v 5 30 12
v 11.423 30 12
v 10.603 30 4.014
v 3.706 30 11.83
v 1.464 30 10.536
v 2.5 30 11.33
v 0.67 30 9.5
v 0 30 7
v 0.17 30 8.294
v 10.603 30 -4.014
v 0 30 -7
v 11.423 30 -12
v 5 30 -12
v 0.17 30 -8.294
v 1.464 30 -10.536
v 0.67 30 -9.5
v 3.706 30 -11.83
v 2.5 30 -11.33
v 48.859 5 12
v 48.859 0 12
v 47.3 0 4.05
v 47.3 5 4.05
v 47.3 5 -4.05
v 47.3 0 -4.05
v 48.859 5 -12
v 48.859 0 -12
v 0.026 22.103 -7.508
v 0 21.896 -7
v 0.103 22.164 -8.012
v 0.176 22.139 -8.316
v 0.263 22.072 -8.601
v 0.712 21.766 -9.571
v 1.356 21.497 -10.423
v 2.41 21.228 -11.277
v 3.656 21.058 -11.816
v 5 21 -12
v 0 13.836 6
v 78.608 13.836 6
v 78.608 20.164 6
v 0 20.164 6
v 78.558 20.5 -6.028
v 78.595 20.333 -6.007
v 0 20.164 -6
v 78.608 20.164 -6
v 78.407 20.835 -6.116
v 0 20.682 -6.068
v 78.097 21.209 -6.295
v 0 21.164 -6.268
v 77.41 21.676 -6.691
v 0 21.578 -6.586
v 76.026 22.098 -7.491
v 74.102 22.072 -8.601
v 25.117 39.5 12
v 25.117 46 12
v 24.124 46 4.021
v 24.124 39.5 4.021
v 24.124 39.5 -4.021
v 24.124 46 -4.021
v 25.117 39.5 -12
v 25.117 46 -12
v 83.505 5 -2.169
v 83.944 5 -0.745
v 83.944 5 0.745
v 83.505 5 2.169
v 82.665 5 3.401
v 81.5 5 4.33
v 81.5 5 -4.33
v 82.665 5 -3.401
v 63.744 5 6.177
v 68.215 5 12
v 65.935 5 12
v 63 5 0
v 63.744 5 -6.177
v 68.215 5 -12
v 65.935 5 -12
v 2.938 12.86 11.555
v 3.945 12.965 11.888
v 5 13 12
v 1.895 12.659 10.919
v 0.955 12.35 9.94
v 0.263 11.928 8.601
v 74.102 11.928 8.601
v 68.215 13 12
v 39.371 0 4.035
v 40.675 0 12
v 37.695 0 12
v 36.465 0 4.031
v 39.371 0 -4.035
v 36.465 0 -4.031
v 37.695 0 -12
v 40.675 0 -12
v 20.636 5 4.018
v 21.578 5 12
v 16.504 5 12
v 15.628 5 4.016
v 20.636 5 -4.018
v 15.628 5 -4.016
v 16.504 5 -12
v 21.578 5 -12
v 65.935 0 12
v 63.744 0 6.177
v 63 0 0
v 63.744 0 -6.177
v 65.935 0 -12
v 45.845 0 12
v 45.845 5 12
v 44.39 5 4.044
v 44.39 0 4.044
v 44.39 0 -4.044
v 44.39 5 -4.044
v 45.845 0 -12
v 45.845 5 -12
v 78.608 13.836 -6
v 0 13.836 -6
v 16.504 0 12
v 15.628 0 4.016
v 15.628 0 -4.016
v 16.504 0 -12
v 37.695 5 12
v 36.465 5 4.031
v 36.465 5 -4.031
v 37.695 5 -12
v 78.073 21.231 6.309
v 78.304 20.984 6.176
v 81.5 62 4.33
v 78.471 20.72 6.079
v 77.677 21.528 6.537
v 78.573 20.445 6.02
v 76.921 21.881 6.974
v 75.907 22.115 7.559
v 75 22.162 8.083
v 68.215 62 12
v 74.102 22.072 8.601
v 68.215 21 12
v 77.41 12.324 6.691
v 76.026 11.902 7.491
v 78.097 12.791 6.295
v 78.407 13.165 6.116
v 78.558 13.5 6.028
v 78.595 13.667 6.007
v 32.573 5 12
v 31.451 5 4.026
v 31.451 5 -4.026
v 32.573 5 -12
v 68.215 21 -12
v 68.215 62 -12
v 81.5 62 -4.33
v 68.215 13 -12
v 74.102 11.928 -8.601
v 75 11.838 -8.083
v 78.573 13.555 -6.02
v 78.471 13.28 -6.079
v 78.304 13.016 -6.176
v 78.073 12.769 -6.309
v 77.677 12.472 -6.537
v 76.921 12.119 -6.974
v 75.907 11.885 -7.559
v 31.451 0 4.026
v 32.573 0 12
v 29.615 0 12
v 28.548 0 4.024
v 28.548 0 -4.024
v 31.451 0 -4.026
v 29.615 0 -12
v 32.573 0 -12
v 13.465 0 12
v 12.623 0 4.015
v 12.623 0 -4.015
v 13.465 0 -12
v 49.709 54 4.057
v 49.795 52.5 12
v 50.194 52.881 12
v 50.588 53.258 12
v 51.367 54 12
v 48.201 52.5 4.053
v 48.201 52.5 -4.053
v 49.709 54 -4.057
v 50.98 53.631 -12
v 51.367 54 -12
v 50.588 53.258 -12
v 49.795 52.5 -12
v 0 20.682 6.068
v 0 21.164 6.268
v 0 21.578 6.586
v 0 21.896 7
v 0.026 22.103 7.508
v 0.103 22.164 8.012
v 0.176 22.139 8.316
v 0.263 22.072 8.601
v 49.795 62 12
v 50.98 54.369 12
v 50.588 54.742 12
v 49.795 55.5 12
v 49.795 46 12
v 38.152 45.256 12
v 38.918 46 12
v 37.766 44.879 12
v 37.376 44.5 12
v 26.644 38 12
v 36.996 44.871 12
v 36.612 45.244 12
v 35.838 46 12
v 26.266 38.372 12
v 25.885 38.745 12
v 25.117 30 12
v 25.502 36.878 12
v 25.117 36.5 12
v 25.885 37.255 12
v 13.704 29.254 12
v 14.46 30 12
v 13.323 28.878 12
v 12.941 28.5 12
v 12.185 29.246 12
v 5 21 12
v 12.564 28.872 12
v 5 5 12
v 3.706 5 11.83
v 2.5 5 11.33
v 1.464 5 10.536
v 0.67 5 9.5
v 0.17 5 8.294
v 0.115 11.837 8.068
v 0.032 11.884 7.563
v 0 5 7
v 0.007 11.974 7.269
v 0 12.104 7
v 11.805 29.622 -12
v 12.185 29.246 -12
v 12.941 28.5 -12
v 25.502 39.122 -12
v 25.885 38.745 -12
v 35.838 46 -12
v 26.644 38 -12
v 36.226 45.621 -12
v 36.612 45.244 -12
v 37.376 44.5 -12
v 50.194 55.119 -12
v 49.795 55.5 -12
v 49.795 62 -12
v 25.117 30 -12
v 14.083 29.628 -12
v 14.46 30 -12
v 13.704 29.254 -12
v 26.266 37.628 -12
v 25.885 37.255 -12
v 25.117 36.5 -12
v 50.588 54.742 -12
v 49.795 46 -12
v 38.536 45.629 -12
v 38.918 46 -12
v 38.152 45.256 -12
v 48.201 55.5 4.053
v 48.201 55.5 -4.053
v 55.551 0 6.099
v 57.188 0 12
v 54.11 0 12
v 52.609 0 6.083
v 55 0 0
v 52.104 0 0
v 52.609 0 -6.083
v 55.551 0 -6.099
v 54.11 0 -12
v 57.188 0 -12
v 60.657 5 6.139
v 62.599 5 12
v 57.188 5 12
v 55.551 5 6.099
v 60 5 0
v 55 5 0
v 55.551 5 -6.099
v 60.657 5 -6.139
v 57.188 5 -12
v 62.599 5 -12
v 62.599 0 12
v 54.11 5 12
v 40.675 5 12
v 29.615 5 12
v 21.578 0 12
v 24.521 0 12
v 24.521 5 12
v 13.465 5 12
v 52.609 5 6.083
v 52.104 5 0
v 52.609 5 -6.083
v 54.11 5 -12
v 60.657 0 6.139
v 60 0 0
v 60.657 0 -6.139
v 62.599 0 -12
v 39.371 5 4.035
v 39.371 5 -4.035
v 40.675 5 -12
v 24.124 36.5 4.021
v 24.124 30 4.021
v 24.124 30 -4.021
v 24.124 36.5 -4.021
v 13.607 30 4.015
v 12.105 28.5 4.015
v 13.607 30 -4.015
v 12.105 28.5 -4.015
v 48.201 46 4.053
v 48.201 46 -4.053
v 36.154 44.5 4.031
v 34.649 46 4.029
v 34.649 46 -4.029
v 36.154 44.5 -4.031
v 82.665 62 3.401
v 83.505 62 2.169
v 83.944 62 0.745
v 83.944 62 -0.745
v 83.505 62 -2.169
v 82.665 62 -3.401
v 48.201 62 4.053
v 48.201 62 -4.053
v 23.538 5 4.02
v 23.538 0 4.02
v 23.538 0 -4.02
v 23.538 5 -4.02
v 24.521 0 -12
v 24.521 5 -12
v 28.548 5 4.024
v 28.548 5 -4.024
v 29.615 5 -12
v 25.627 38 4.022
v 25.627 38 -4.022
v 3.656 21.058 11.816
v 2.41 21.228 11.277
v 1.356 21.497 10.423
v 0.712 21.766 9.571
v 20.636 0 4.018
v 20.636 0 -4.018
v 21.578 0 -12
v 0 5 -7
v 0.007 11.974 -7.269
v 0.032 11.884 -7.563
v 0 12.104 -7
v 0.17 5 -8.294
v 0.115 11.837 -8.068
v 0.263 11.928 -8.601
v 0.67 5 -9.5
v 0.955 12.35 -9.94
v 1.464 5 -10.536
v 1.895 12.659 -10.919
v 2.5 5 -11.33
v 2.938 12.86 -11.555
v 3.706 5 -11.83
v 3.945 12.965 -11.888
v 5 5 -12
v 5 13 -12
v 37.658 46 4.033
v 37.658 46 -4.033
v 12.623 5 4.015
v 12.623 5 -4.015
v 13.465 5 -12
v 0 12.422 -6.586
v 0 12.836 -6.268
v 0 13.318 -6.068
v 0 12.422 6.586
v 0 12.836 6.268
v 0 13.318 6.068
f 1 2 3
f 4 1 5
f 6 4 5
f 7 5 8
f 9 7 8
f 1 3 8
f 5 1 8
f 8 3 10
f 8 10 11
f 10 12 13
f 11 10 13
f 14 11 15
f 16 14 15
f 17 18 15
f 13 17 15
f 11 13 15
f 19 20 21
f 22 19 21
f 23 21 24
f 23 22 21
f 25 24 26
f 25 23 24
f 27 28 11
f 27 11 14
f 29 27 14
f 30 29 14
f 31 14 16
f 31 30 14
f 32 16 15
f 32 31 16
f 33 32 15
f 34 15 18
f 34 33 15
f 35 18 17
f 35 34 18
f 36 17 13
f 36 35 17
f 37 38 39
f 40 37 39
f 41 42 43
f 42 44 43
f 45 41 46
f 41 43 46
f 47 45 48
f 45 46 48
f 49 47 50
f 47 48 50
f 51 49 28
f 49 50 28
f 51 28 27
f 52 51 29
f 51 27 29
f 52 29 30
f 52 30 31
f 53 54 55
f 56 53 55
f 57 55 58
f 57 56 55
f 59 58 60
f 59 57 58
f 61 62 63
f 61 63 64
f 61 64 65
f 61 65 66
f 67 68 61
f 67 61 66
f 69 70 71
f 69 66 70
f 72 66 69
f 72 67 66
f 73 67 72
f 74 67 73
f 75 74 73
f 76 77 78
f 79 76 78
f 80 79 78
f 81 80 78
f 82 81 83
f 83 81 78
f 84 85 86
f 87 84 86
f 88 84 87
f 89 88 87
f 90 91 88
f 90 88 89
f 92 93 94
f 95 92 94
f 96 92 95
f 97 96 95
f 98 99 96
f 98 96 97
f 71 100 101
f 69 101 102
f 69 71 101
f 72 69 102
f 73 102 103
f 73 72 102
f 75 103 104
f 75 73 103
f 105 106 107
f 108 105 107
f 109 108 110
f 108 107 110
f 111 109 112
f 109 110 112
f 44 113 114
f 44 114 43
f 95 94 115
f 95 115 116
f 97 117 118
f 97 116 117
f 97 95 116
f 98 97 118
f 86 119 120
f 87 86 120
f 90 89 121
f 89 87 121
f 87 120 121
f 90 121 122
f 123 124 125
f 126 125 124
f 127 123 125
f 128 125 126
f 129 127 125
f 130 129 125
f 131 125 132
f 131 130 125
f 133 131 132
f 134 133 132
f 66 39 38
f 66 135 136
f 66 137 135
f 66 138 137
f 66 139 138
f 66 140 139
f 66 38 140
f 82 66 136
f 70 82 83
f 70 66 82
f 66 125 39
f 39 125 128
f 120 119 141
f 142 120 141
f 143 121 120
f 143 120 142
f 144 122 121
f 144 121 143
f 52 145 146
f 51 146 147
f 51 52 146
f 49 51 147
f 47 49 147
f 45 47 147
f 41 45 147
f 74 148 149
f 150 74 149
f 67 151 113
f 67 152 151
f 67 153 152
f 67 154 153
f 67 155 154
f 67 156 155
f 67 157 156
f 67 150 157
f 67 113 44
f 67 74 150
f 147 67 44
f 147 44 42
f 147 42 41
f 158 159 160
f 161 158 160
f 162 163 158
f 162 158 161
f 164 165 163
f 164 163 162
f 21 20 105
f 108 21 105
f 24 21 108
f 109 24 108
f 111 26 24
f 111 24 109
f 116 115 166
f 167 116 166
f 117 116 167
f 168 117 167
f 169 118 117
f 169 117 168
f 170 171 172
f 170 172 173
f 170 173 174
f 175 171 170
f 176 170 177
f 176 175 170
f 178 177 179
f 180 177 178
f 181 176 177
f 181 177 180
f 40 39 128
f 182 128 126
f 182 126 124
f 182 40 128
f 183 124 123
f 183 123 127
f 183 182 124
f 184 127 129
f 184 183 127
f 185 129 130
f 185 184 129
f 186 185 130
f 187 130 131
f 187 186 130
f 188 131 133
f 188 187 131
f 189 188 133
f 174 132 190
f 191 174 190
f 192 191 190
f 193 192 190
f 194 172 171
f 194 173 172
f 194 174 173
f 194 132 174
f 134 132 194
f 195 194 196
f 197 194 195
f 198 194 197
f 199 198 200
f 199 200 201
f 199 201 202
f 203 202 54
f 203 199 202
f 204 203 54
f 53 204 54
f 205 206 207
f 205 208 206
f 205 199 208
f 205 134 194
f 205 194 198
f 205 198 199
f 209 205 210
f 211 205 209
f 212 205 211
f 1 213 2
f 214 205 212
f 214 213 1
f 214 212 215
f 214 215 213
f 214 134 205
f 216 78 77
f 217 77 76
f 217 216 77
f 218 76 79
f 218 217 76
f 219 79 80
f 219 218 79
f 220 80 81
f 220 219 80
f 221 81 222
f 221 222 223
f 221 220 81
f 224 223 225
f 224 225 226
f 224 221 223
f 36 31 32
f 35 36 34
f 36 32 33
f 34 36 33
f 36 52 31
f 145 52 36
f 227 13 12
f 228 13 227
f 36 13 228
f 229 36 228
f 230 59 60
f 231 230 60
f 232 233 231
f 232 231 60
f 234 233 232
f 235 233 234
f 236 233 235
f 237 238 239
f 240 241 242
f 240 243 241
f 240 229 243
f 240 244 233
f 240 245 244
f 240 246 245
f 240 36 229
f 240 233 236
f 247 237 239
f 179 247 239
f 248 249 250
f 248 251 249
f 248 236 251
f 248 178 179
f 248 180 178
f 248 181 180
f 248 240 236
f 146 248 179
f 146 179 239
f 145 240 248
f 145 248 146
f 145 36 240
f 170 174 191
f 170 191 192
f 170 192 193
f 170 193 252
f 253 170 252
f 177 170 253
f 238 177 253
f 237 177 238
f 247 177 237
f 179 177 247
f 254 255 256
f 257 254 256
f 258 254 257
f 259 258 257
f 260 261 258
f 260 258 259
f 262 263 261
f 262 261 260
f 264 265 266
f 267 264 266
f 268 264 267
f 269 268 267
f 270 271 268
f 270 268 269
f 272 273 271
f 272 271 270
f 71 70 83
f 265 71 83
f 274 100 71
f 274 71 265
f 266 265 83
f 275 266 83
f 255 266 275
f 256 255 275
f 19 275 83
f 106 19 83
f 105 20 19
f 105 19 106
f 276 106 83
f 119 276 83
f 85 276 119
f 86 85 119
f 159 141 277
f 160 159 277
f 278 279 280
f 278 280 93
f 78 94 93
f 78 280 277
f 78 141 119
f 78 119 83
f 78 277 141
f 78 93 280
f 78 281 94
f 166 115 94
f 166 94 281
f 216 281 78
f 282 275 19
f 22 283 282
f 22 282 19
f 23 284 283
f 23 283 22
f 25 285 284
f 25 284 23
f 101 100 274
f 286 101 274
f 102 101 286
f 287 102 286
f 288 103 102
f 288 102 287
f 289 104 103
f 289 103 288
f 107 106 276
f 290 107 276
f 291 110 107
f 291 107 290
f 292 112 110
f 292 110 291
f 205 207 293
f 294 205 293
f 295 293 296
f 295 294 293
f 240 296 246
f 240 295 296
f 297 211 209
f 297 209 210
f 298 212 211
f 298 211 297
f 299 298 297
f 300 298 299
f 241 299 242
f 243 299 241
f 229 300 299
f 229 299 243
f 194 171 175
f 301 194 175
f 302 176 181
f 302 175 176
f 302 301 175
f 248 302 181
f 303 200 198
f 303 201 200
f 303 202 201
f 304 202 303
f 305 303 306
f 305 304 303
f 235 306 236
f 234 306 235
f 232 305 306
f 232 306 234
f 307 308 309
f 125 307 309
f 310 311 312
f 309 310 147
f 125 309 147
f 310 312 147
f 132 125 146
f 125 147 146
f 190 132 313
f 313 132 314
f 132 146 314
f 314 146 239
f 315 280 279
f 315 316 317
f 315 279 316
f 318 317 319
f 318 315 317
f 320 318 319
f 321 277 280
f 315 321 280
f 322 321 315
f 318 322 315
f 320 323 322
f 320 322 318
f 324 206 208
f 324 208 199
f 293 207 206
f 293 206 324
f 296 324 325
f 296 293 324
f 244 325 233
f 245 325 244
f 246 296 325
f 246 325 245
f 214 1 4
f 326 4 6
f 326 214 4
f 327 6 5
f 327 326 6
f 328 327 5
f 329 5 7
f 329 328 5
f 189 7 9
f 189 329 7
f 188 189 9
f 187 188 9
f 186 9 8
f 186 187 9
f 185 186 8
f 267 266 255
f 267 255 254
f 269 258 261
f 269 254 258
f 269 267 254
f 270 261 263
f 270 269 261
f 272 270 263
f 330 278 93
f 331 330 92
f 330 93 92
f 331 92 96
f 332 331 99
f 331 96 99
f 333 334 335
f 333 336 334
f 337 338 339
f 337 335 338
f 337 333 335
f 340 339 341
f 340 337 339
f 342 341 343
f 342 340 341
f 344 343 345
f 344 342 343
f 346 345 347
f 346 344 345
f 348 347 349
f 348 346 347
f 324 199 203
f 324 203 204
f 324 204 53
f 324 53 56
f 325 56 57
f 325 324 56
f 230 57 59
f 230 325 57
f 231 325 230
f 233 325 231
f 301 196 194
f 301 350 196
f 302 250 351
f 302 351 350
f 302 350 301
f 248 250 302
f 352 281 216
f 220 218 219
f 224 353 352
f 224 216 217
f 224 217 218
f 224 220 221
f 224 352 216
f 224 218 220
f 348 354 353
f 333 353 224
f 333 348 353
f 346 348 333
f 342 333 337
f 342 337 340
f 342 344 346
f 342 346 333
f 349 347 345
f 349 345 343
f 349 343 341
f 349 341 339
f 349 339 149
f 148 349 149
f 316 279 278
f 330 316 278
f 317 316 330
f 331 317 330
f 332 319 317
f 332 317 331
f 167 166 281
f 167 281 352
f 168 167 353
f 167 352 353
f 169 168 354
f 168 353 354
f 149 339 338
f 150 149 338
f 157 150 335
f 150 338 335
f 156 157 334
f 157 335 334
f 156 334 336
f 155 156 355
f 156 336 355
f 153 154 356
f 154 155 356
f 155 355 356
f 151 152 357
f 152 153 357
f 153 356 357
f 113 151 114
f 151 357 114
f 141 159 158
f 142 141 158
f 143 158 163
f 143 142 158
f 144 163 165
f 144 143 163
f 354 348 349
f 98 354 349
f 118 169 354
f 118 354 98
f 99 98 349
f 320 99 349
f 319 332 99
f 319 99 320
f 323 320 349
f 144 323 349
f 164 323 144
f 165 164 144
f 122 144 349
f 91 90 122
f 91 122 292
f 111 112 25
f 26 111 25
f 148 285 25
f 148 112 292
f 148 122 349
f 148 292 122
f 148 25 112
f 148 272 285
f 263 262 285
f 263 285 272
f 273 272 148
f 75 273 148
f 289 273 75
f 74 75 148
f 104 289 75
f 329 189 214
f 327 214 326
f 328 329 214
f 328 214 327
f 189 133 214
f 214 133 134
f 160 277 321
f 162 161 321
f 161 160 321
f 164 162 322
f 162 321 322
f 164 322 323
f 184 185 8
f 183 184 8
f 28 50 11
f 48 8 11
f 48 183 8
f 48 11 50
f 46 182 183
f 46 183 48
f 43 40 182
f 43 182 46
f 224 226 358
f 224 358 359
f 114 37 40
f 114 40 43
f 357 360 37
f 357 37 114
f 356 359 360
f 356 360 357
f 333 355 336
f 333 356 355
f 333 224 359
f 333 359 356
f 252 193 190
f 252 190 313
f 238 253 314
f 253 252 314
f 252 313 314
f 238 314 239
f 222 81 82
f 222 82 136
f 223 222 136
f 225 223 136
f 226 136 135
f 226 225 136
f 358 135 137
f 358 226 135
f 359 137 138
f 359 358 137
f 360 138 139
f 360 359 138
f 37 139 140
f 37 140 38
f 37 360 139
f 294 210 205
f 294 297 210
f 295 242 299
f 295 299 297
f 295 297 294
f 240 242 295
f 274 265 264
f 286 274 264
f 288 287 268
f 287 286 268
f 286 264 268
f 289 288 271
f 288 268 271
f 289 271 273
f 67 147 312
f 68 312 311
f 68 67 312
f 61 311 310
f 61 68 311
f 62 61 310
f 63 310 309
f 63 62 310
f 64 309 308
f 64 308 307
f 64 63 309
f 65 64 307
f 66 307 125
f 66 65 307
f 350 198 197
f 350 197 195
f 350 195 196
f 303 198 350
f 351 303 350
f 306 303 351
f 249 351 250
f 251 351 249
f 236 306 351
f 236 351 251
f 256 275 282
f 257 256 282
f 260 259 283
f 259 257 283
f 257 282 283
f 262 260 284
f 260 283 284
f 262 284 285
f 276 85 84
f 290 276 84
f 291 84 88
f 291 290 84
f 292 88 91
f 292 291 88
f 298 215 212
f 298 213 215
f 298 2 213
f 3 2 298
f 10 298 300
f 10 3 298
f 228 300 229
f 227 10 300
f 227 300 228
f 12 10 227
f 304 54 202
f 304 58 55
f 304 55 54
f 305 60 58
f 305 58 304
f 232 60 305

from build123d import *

# Parameters (mm, degrees)
BOSS_EXTRUDE1_DEPTH = 62
SKETCH5_W           = 26
SKETCH5_H           = 5
SKETCH5_W_2         = 5
SKETCH5_W_3         = 14.428632876
CUT_EXTRUDE1_DEPTH  = 106.090437243


with BuildPart() as part:
    # Sketch1 → Boss-Extrude1 (new body)
    with BuildSketch(Plane(origin=(0, 0, 0), x_dir=(1, 0, 0), z_dir=(0, 1, 0))):
        with BuildLine():
            Line((0, -7), (0, 7))
            ThreePointArc((0, 7), (1.464466094, 10.535533906), (5, 12))
            Line((5, 12), (68.215390309, 12))
            Line((68.215390309, 12), (81.5, 4.330127019))
            ThreePointArc((81.5, 4.330127019), (84, 0), (81.5, -4.330127019))
            Line((81.5, -4.330127019), (68.215390309, -12))
            Line((68.215390309, -12), (5, -12))
            ThreePointArc((5, -12), (1.464466094, -10.535533906), (0, -7))
        make_face()
    extrude(amount=BOSS_EXTRUDE1_DEPTH)

    # Sketch2 → Cut-Revolve1 (revolve, cut)
    with BuildSketch(Plane.XY):
        Polygon((48, 62), (48, 55.5), (49.5, 54), (48, 52.5), (48, 46), (37.5, 46), (36, 44.5), (34.5, 46), (24, 46), (24, 39.5), (25.5, 38), (24, 36.5), (24, 30), (13.5, 30), (12, 28.5), (10.5, 30), (0, 30), (-10, 30), (-10, 72), (48, 72), align=None)
    revolve(axis=Axis((89, 71.362230297, 0), (0, -1, 0)), mode=Mode.SUBTRACT)

    # Sketch5 → Cut-Revolve2 (revolve, cut)
    with BuildSketch(Plane.XY):
        with Locations((76, 2.5)):
            Rectangle(SKETCH5_W, SKETCH5_H)
        with Locations((57.5, 2.5)):
            Rectangle(SKETCH5_W_2, SKETCH5_H)
        with Locations((49.603587942, 2.5)):
            Rectangle(SKETCH5_W_2, SKETCH5_H)
        with Locations((41.707175883, 2.5)):
            Rectangle(SKETCH5_W_2, SKETCH5_H)
        with Locations((33.810763825, 2.5)):
            Rectangle(SKETCH5_W_2, SKETCH5_H)
        with Locations((25.914351767, 2.5)):
            Rectangle(SKETCH5_W_2, SKETCH5_H)
        with Locations((18.017939709, 2.5)):
            Rectangle(SKETCH5_W_2, SKETCH5_H)
        with Locations((5.303623271, 2.5)):
            Rectangle(SKETCH5_W_3, SKETCH5_H)
    revolve(axis=Axis((89, 64.780829091, 0), (0, -1, 0)), mode=Mode.SUBTRACT)

    # Sketch6 → Cut-Extrude1 (cut, through all)
    with BuildSketch(Plane(origin=(0, 0, 0), x_dir=(0, 0, -1), z_dir=(1, 0, 0))):
        with BuildLine():
            ThreePointArc((8.601411599, 11.928429193), (6.817380703, 12.222973886), (6, 13.835863095))
            Line((6, 13.835863095), (6, 20.164136905))
            ThreePointArc((6, 20.164136905), (6.817380703, 21.777026114), (8.601411599, 22.071570807))
            Line((8.601411599, 22.071570807), (12, 21))
            Line((12, 21), (12.955765894, 20.698648171))
            Line((12.955765894, 20.698648171), (12.955765894, 13.301351829))
            Line((12.955765894, 13.301351829), (12, 13))
            Line((12, 13), (8.601411599, 11.928429193))
        make_face()
        with BuildLine():
            Line((-6, 13.835863095), (-6, 20.164136905))
            ThreePointArc((-6, 20.164136905), (-6.817380703, 21.777026114), (-8.601411599, 22.071570807))
            Line((-8.601411599, 22.071570807), (-12, 21))
            Line((-12, 21), (-12.955765894, 20.698648171))
            Line((-12.955765894, 20.698648171), (-12.955765894, 13.301351829))
            Line((-12.955765894, 13.301351829), (-12, 13))
            Line((-12, 13), (-8.601411599, 11.928429193))
            ThreePointArc((-8.601411599, 11.928429193), (-6.817380703, 12.222973886), (-6, 13.835863095))
        make_face()
    extrude(amount=CUT_EXTRUDE1_DEPTH, mode=Mode.SUBTRACT)


solid = part.part
